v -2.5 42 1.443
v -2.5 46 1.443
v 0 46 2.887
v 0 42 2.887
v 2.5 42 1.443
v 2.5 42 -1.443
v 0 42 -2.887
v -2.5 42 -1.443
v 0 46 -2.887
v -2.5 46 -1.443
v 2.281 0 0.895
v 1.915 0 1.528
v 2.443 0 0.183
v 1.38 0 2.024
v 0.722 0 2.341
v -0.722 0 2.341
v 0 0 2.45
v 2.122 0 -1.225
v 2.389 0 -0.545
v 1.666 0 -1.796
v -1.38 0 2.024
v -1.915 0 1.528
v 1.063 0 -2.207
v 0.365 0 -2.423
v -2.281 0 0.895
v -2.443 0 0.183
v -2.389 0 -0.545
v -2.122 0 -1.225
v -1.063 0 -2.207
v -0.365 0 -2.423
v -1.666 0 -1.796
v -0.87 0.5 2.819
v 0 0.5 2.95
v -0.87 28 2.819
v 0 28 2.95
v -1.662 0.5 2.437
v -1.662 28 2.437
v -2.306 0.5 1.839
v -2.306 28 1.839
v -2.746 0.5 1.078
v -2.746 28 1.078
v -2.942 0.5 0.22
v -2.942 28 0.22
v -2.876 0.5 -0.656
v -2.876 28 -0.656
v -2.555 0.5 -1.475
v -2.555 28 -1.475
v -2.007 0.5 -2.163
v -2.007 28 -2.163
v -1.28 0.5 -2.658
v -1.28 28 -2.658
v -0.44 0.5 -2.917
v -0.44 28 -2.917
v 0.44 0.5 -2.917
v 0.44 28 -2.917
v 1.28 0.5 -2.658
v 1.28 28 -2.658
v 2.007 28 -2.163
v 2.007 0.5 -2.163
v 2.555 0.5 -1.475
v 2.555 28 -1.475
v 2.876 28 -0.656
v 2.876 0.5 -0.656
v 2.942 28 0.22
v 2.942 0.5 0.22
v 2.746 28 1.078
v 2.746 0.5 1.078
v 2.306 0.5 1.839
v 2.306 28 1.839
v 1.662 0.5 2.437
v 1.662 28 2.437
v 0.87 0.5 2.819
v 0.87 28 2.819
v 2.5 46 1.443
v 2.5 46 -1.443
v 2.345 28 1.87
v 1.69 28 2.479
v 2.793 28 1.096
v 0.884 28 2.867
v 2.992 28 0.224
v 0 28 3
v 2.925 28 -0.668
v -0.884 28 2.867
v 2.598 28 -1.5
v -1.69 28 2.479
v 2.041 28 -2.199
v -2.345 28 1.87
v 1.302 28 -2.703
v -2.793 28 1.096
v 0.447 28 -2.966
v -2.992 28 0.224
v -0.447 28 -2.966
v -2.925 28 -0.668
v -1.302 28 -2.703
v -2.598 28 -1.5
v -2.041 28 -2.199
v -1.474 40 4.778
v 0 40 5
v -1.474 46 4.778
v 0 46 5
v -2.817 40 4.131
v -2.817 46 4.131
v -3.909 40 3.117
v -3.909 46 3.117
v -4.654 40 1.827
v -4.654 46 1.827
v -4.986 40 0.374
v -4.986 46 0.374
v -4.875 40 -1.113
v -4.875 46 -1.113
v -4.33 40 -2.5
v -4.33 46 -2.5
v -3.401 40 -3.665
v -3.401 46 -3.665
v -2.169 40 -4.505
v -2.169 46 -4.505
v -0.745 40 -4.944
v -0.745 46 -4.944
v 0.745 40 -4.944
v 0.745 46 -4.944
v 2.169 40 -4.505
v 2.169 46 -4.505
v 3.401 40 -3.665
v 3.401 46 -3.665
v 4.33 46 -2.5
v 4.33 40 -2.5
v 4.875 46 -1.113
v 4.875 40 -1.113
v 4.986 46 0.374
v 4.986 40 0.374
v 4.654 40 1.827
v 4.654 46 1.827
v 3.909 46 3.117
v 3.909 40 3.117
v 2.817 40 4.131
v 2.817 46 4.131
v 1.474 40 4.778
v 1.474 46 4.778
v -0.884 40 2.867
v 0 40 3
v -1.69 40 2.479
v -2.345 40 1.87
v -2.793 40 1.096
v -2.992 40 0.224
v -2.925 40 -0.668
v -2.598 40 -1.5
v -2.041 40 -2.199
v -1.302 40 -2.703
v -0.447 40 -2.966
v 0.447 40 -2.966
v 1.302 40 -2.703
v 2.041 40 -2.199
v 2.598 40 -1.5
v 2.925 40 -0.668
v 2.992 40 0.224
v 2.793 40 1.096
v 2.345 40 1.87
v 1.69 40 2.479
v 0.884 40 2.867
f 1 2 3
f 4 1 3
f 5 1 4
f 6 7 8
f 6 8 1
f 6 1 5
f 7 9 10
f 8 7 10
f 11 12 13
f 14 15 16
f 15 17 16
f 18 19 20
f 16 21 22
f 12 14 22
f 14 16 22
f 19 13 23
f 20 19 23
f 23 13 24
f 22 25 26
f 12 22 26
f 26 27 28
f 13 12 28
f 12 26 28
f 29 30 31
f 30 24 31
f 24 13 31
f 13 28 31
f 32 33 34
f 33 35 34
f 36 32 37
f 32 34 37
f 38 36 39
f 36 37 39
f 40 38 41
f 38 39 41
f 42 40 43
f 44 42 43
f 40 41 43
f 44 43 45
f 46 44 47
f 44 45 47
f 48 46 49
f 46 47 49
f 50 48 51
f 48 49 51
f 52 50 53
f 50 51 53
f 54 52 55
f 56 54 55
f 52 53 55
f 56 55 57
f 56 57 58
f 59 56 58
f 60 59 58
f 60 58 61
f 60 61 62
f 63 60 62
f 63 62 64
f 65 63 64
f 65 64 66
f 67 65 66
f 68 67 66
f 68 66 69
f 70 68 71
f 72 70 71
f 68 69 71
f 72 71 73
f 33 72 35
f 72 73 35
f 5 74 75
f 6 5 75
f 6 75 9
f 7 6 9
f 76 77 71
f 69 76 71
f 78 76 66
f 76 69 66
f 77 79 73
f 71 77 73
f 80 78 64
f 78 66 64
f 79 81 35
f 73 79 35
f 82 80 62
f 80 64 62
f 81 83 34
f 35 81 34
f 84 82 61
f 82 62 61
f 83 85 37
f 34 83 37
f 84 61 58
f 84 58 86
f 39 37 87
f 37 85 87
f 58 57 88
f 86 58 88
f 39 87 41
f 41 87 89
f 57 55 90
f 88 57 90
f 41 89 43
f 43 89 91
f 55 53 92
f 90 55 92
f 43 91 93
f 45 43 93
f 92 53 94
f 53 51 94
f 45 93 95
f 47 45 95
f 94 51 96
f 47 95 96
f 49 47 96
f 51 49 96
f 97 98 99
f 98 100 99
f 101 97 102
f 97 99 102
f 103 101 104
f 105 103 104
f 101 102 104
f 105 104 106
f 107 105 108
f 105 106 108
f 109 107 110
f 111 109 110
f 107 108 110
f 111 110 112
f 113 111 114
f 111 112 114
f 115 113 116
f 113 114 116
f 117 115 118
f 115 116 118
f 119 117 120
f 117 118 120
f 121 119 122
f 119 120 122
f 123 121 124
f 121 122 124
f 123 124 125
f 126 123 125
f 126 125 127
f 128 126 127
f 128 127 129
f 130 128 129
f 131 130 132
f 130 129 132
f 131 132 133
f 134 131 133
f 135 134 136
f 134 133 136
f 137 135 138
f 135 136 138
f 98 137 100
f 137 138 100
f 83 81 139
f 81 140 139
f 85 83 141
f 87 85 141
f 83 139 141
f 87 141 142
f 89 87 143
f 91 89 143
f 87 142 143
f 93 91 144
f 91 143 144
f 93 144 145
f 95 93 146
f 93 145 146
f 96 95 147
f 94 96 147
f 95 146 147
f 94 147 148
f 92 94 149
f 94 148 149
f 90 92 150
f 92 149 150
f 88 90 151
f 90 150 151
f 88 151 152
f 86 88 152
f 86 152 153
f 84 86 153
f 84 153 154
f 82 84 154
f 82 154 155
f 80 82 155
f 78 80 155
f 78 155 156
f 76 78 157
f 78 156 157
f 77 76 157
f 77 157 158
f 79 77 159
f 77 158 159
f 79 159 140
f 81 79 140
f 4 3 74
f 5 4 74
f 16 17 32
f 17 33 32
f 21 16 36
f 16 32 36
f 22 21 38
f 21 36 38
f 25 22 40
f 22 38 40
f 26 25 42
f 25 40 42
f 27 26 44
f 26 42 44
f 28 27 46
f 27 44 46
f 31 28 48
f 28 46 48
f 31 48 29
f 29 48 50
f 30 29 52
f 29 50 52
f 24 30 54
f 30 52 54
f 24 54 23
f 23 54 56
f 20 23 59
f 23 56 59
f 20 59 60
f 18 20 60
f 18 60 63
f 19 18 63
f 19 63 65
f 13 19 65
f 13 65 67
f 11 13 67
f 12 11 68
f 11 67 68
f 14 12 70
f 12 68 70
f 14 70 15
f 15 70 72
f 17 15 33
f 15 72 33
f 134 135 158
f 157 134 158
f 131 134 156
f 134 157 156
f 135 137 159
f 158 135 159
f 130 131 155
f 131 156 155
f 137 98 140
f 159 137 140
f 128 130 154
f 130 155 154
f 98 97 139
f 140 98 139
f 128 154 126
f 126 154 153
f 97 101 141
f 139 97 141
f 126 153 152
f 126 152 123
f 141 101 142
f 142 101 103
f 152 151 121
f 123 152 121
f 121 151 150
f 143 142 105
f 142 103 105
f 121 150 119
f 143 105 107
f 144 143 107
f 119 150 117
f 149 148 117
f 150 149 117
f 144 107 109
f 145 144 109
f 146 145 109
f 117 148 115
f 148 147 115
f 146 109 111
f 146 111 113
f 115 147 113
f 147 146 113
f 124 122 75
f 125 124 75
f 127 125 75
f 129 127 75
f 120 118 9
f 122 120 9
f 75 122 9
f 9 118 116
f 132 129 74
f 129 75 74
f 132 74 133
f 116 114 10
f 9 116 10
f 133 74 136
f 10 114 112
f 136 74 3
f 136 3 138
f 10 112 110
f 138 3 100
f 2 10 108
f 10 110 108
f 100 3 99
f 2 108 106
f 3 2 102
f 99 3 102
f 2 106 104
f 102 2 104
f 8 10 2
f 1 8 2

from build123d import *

# Parameters (mm, degrees)
ENL_V_MAT_EXTRU_1_DEPTH = 4


with BuildPart() as part:
    # Esquisse1 → Révolution1 (revolve)
    with BuildSketch(Plane.XY, mode=Mode.PRIVATE) as r_volution1_sk:
        Polygon((0, 0), (-2.45, 0), (-2.95, 0.5), (-2.95, 28), (-3, 28), (-3, 40), (-5, 40), (-5, 46), (0, 46), align=None)
    revolve(r_volution1_sk.sketch.rotate(Axis((0, 46, 0), (0, -1, 0)), 270), axis=Axis((0, 46, 0), (0, -1, 0)))

    # Esquisse2 → Enlèv. mat.-Extru.1 (cut)
    with BuildSketch(Plane(origin=(0, 46, 0), x_dir=(1, 0, 0), z_dir=(0, 1, 0))):
        Polygon((2.5, -1.443375673), (2.5, 1.443375673), (0, 2.886751346), (-2.5, 1.443375673), (-2.5, -1.443375673), (0, -2.886751346), align=None)
    extrude(amount=-ENL_V_MAT_EXTRU_1_DEPTH, mode=Mode.SUBTRACT)


solid = part.part
